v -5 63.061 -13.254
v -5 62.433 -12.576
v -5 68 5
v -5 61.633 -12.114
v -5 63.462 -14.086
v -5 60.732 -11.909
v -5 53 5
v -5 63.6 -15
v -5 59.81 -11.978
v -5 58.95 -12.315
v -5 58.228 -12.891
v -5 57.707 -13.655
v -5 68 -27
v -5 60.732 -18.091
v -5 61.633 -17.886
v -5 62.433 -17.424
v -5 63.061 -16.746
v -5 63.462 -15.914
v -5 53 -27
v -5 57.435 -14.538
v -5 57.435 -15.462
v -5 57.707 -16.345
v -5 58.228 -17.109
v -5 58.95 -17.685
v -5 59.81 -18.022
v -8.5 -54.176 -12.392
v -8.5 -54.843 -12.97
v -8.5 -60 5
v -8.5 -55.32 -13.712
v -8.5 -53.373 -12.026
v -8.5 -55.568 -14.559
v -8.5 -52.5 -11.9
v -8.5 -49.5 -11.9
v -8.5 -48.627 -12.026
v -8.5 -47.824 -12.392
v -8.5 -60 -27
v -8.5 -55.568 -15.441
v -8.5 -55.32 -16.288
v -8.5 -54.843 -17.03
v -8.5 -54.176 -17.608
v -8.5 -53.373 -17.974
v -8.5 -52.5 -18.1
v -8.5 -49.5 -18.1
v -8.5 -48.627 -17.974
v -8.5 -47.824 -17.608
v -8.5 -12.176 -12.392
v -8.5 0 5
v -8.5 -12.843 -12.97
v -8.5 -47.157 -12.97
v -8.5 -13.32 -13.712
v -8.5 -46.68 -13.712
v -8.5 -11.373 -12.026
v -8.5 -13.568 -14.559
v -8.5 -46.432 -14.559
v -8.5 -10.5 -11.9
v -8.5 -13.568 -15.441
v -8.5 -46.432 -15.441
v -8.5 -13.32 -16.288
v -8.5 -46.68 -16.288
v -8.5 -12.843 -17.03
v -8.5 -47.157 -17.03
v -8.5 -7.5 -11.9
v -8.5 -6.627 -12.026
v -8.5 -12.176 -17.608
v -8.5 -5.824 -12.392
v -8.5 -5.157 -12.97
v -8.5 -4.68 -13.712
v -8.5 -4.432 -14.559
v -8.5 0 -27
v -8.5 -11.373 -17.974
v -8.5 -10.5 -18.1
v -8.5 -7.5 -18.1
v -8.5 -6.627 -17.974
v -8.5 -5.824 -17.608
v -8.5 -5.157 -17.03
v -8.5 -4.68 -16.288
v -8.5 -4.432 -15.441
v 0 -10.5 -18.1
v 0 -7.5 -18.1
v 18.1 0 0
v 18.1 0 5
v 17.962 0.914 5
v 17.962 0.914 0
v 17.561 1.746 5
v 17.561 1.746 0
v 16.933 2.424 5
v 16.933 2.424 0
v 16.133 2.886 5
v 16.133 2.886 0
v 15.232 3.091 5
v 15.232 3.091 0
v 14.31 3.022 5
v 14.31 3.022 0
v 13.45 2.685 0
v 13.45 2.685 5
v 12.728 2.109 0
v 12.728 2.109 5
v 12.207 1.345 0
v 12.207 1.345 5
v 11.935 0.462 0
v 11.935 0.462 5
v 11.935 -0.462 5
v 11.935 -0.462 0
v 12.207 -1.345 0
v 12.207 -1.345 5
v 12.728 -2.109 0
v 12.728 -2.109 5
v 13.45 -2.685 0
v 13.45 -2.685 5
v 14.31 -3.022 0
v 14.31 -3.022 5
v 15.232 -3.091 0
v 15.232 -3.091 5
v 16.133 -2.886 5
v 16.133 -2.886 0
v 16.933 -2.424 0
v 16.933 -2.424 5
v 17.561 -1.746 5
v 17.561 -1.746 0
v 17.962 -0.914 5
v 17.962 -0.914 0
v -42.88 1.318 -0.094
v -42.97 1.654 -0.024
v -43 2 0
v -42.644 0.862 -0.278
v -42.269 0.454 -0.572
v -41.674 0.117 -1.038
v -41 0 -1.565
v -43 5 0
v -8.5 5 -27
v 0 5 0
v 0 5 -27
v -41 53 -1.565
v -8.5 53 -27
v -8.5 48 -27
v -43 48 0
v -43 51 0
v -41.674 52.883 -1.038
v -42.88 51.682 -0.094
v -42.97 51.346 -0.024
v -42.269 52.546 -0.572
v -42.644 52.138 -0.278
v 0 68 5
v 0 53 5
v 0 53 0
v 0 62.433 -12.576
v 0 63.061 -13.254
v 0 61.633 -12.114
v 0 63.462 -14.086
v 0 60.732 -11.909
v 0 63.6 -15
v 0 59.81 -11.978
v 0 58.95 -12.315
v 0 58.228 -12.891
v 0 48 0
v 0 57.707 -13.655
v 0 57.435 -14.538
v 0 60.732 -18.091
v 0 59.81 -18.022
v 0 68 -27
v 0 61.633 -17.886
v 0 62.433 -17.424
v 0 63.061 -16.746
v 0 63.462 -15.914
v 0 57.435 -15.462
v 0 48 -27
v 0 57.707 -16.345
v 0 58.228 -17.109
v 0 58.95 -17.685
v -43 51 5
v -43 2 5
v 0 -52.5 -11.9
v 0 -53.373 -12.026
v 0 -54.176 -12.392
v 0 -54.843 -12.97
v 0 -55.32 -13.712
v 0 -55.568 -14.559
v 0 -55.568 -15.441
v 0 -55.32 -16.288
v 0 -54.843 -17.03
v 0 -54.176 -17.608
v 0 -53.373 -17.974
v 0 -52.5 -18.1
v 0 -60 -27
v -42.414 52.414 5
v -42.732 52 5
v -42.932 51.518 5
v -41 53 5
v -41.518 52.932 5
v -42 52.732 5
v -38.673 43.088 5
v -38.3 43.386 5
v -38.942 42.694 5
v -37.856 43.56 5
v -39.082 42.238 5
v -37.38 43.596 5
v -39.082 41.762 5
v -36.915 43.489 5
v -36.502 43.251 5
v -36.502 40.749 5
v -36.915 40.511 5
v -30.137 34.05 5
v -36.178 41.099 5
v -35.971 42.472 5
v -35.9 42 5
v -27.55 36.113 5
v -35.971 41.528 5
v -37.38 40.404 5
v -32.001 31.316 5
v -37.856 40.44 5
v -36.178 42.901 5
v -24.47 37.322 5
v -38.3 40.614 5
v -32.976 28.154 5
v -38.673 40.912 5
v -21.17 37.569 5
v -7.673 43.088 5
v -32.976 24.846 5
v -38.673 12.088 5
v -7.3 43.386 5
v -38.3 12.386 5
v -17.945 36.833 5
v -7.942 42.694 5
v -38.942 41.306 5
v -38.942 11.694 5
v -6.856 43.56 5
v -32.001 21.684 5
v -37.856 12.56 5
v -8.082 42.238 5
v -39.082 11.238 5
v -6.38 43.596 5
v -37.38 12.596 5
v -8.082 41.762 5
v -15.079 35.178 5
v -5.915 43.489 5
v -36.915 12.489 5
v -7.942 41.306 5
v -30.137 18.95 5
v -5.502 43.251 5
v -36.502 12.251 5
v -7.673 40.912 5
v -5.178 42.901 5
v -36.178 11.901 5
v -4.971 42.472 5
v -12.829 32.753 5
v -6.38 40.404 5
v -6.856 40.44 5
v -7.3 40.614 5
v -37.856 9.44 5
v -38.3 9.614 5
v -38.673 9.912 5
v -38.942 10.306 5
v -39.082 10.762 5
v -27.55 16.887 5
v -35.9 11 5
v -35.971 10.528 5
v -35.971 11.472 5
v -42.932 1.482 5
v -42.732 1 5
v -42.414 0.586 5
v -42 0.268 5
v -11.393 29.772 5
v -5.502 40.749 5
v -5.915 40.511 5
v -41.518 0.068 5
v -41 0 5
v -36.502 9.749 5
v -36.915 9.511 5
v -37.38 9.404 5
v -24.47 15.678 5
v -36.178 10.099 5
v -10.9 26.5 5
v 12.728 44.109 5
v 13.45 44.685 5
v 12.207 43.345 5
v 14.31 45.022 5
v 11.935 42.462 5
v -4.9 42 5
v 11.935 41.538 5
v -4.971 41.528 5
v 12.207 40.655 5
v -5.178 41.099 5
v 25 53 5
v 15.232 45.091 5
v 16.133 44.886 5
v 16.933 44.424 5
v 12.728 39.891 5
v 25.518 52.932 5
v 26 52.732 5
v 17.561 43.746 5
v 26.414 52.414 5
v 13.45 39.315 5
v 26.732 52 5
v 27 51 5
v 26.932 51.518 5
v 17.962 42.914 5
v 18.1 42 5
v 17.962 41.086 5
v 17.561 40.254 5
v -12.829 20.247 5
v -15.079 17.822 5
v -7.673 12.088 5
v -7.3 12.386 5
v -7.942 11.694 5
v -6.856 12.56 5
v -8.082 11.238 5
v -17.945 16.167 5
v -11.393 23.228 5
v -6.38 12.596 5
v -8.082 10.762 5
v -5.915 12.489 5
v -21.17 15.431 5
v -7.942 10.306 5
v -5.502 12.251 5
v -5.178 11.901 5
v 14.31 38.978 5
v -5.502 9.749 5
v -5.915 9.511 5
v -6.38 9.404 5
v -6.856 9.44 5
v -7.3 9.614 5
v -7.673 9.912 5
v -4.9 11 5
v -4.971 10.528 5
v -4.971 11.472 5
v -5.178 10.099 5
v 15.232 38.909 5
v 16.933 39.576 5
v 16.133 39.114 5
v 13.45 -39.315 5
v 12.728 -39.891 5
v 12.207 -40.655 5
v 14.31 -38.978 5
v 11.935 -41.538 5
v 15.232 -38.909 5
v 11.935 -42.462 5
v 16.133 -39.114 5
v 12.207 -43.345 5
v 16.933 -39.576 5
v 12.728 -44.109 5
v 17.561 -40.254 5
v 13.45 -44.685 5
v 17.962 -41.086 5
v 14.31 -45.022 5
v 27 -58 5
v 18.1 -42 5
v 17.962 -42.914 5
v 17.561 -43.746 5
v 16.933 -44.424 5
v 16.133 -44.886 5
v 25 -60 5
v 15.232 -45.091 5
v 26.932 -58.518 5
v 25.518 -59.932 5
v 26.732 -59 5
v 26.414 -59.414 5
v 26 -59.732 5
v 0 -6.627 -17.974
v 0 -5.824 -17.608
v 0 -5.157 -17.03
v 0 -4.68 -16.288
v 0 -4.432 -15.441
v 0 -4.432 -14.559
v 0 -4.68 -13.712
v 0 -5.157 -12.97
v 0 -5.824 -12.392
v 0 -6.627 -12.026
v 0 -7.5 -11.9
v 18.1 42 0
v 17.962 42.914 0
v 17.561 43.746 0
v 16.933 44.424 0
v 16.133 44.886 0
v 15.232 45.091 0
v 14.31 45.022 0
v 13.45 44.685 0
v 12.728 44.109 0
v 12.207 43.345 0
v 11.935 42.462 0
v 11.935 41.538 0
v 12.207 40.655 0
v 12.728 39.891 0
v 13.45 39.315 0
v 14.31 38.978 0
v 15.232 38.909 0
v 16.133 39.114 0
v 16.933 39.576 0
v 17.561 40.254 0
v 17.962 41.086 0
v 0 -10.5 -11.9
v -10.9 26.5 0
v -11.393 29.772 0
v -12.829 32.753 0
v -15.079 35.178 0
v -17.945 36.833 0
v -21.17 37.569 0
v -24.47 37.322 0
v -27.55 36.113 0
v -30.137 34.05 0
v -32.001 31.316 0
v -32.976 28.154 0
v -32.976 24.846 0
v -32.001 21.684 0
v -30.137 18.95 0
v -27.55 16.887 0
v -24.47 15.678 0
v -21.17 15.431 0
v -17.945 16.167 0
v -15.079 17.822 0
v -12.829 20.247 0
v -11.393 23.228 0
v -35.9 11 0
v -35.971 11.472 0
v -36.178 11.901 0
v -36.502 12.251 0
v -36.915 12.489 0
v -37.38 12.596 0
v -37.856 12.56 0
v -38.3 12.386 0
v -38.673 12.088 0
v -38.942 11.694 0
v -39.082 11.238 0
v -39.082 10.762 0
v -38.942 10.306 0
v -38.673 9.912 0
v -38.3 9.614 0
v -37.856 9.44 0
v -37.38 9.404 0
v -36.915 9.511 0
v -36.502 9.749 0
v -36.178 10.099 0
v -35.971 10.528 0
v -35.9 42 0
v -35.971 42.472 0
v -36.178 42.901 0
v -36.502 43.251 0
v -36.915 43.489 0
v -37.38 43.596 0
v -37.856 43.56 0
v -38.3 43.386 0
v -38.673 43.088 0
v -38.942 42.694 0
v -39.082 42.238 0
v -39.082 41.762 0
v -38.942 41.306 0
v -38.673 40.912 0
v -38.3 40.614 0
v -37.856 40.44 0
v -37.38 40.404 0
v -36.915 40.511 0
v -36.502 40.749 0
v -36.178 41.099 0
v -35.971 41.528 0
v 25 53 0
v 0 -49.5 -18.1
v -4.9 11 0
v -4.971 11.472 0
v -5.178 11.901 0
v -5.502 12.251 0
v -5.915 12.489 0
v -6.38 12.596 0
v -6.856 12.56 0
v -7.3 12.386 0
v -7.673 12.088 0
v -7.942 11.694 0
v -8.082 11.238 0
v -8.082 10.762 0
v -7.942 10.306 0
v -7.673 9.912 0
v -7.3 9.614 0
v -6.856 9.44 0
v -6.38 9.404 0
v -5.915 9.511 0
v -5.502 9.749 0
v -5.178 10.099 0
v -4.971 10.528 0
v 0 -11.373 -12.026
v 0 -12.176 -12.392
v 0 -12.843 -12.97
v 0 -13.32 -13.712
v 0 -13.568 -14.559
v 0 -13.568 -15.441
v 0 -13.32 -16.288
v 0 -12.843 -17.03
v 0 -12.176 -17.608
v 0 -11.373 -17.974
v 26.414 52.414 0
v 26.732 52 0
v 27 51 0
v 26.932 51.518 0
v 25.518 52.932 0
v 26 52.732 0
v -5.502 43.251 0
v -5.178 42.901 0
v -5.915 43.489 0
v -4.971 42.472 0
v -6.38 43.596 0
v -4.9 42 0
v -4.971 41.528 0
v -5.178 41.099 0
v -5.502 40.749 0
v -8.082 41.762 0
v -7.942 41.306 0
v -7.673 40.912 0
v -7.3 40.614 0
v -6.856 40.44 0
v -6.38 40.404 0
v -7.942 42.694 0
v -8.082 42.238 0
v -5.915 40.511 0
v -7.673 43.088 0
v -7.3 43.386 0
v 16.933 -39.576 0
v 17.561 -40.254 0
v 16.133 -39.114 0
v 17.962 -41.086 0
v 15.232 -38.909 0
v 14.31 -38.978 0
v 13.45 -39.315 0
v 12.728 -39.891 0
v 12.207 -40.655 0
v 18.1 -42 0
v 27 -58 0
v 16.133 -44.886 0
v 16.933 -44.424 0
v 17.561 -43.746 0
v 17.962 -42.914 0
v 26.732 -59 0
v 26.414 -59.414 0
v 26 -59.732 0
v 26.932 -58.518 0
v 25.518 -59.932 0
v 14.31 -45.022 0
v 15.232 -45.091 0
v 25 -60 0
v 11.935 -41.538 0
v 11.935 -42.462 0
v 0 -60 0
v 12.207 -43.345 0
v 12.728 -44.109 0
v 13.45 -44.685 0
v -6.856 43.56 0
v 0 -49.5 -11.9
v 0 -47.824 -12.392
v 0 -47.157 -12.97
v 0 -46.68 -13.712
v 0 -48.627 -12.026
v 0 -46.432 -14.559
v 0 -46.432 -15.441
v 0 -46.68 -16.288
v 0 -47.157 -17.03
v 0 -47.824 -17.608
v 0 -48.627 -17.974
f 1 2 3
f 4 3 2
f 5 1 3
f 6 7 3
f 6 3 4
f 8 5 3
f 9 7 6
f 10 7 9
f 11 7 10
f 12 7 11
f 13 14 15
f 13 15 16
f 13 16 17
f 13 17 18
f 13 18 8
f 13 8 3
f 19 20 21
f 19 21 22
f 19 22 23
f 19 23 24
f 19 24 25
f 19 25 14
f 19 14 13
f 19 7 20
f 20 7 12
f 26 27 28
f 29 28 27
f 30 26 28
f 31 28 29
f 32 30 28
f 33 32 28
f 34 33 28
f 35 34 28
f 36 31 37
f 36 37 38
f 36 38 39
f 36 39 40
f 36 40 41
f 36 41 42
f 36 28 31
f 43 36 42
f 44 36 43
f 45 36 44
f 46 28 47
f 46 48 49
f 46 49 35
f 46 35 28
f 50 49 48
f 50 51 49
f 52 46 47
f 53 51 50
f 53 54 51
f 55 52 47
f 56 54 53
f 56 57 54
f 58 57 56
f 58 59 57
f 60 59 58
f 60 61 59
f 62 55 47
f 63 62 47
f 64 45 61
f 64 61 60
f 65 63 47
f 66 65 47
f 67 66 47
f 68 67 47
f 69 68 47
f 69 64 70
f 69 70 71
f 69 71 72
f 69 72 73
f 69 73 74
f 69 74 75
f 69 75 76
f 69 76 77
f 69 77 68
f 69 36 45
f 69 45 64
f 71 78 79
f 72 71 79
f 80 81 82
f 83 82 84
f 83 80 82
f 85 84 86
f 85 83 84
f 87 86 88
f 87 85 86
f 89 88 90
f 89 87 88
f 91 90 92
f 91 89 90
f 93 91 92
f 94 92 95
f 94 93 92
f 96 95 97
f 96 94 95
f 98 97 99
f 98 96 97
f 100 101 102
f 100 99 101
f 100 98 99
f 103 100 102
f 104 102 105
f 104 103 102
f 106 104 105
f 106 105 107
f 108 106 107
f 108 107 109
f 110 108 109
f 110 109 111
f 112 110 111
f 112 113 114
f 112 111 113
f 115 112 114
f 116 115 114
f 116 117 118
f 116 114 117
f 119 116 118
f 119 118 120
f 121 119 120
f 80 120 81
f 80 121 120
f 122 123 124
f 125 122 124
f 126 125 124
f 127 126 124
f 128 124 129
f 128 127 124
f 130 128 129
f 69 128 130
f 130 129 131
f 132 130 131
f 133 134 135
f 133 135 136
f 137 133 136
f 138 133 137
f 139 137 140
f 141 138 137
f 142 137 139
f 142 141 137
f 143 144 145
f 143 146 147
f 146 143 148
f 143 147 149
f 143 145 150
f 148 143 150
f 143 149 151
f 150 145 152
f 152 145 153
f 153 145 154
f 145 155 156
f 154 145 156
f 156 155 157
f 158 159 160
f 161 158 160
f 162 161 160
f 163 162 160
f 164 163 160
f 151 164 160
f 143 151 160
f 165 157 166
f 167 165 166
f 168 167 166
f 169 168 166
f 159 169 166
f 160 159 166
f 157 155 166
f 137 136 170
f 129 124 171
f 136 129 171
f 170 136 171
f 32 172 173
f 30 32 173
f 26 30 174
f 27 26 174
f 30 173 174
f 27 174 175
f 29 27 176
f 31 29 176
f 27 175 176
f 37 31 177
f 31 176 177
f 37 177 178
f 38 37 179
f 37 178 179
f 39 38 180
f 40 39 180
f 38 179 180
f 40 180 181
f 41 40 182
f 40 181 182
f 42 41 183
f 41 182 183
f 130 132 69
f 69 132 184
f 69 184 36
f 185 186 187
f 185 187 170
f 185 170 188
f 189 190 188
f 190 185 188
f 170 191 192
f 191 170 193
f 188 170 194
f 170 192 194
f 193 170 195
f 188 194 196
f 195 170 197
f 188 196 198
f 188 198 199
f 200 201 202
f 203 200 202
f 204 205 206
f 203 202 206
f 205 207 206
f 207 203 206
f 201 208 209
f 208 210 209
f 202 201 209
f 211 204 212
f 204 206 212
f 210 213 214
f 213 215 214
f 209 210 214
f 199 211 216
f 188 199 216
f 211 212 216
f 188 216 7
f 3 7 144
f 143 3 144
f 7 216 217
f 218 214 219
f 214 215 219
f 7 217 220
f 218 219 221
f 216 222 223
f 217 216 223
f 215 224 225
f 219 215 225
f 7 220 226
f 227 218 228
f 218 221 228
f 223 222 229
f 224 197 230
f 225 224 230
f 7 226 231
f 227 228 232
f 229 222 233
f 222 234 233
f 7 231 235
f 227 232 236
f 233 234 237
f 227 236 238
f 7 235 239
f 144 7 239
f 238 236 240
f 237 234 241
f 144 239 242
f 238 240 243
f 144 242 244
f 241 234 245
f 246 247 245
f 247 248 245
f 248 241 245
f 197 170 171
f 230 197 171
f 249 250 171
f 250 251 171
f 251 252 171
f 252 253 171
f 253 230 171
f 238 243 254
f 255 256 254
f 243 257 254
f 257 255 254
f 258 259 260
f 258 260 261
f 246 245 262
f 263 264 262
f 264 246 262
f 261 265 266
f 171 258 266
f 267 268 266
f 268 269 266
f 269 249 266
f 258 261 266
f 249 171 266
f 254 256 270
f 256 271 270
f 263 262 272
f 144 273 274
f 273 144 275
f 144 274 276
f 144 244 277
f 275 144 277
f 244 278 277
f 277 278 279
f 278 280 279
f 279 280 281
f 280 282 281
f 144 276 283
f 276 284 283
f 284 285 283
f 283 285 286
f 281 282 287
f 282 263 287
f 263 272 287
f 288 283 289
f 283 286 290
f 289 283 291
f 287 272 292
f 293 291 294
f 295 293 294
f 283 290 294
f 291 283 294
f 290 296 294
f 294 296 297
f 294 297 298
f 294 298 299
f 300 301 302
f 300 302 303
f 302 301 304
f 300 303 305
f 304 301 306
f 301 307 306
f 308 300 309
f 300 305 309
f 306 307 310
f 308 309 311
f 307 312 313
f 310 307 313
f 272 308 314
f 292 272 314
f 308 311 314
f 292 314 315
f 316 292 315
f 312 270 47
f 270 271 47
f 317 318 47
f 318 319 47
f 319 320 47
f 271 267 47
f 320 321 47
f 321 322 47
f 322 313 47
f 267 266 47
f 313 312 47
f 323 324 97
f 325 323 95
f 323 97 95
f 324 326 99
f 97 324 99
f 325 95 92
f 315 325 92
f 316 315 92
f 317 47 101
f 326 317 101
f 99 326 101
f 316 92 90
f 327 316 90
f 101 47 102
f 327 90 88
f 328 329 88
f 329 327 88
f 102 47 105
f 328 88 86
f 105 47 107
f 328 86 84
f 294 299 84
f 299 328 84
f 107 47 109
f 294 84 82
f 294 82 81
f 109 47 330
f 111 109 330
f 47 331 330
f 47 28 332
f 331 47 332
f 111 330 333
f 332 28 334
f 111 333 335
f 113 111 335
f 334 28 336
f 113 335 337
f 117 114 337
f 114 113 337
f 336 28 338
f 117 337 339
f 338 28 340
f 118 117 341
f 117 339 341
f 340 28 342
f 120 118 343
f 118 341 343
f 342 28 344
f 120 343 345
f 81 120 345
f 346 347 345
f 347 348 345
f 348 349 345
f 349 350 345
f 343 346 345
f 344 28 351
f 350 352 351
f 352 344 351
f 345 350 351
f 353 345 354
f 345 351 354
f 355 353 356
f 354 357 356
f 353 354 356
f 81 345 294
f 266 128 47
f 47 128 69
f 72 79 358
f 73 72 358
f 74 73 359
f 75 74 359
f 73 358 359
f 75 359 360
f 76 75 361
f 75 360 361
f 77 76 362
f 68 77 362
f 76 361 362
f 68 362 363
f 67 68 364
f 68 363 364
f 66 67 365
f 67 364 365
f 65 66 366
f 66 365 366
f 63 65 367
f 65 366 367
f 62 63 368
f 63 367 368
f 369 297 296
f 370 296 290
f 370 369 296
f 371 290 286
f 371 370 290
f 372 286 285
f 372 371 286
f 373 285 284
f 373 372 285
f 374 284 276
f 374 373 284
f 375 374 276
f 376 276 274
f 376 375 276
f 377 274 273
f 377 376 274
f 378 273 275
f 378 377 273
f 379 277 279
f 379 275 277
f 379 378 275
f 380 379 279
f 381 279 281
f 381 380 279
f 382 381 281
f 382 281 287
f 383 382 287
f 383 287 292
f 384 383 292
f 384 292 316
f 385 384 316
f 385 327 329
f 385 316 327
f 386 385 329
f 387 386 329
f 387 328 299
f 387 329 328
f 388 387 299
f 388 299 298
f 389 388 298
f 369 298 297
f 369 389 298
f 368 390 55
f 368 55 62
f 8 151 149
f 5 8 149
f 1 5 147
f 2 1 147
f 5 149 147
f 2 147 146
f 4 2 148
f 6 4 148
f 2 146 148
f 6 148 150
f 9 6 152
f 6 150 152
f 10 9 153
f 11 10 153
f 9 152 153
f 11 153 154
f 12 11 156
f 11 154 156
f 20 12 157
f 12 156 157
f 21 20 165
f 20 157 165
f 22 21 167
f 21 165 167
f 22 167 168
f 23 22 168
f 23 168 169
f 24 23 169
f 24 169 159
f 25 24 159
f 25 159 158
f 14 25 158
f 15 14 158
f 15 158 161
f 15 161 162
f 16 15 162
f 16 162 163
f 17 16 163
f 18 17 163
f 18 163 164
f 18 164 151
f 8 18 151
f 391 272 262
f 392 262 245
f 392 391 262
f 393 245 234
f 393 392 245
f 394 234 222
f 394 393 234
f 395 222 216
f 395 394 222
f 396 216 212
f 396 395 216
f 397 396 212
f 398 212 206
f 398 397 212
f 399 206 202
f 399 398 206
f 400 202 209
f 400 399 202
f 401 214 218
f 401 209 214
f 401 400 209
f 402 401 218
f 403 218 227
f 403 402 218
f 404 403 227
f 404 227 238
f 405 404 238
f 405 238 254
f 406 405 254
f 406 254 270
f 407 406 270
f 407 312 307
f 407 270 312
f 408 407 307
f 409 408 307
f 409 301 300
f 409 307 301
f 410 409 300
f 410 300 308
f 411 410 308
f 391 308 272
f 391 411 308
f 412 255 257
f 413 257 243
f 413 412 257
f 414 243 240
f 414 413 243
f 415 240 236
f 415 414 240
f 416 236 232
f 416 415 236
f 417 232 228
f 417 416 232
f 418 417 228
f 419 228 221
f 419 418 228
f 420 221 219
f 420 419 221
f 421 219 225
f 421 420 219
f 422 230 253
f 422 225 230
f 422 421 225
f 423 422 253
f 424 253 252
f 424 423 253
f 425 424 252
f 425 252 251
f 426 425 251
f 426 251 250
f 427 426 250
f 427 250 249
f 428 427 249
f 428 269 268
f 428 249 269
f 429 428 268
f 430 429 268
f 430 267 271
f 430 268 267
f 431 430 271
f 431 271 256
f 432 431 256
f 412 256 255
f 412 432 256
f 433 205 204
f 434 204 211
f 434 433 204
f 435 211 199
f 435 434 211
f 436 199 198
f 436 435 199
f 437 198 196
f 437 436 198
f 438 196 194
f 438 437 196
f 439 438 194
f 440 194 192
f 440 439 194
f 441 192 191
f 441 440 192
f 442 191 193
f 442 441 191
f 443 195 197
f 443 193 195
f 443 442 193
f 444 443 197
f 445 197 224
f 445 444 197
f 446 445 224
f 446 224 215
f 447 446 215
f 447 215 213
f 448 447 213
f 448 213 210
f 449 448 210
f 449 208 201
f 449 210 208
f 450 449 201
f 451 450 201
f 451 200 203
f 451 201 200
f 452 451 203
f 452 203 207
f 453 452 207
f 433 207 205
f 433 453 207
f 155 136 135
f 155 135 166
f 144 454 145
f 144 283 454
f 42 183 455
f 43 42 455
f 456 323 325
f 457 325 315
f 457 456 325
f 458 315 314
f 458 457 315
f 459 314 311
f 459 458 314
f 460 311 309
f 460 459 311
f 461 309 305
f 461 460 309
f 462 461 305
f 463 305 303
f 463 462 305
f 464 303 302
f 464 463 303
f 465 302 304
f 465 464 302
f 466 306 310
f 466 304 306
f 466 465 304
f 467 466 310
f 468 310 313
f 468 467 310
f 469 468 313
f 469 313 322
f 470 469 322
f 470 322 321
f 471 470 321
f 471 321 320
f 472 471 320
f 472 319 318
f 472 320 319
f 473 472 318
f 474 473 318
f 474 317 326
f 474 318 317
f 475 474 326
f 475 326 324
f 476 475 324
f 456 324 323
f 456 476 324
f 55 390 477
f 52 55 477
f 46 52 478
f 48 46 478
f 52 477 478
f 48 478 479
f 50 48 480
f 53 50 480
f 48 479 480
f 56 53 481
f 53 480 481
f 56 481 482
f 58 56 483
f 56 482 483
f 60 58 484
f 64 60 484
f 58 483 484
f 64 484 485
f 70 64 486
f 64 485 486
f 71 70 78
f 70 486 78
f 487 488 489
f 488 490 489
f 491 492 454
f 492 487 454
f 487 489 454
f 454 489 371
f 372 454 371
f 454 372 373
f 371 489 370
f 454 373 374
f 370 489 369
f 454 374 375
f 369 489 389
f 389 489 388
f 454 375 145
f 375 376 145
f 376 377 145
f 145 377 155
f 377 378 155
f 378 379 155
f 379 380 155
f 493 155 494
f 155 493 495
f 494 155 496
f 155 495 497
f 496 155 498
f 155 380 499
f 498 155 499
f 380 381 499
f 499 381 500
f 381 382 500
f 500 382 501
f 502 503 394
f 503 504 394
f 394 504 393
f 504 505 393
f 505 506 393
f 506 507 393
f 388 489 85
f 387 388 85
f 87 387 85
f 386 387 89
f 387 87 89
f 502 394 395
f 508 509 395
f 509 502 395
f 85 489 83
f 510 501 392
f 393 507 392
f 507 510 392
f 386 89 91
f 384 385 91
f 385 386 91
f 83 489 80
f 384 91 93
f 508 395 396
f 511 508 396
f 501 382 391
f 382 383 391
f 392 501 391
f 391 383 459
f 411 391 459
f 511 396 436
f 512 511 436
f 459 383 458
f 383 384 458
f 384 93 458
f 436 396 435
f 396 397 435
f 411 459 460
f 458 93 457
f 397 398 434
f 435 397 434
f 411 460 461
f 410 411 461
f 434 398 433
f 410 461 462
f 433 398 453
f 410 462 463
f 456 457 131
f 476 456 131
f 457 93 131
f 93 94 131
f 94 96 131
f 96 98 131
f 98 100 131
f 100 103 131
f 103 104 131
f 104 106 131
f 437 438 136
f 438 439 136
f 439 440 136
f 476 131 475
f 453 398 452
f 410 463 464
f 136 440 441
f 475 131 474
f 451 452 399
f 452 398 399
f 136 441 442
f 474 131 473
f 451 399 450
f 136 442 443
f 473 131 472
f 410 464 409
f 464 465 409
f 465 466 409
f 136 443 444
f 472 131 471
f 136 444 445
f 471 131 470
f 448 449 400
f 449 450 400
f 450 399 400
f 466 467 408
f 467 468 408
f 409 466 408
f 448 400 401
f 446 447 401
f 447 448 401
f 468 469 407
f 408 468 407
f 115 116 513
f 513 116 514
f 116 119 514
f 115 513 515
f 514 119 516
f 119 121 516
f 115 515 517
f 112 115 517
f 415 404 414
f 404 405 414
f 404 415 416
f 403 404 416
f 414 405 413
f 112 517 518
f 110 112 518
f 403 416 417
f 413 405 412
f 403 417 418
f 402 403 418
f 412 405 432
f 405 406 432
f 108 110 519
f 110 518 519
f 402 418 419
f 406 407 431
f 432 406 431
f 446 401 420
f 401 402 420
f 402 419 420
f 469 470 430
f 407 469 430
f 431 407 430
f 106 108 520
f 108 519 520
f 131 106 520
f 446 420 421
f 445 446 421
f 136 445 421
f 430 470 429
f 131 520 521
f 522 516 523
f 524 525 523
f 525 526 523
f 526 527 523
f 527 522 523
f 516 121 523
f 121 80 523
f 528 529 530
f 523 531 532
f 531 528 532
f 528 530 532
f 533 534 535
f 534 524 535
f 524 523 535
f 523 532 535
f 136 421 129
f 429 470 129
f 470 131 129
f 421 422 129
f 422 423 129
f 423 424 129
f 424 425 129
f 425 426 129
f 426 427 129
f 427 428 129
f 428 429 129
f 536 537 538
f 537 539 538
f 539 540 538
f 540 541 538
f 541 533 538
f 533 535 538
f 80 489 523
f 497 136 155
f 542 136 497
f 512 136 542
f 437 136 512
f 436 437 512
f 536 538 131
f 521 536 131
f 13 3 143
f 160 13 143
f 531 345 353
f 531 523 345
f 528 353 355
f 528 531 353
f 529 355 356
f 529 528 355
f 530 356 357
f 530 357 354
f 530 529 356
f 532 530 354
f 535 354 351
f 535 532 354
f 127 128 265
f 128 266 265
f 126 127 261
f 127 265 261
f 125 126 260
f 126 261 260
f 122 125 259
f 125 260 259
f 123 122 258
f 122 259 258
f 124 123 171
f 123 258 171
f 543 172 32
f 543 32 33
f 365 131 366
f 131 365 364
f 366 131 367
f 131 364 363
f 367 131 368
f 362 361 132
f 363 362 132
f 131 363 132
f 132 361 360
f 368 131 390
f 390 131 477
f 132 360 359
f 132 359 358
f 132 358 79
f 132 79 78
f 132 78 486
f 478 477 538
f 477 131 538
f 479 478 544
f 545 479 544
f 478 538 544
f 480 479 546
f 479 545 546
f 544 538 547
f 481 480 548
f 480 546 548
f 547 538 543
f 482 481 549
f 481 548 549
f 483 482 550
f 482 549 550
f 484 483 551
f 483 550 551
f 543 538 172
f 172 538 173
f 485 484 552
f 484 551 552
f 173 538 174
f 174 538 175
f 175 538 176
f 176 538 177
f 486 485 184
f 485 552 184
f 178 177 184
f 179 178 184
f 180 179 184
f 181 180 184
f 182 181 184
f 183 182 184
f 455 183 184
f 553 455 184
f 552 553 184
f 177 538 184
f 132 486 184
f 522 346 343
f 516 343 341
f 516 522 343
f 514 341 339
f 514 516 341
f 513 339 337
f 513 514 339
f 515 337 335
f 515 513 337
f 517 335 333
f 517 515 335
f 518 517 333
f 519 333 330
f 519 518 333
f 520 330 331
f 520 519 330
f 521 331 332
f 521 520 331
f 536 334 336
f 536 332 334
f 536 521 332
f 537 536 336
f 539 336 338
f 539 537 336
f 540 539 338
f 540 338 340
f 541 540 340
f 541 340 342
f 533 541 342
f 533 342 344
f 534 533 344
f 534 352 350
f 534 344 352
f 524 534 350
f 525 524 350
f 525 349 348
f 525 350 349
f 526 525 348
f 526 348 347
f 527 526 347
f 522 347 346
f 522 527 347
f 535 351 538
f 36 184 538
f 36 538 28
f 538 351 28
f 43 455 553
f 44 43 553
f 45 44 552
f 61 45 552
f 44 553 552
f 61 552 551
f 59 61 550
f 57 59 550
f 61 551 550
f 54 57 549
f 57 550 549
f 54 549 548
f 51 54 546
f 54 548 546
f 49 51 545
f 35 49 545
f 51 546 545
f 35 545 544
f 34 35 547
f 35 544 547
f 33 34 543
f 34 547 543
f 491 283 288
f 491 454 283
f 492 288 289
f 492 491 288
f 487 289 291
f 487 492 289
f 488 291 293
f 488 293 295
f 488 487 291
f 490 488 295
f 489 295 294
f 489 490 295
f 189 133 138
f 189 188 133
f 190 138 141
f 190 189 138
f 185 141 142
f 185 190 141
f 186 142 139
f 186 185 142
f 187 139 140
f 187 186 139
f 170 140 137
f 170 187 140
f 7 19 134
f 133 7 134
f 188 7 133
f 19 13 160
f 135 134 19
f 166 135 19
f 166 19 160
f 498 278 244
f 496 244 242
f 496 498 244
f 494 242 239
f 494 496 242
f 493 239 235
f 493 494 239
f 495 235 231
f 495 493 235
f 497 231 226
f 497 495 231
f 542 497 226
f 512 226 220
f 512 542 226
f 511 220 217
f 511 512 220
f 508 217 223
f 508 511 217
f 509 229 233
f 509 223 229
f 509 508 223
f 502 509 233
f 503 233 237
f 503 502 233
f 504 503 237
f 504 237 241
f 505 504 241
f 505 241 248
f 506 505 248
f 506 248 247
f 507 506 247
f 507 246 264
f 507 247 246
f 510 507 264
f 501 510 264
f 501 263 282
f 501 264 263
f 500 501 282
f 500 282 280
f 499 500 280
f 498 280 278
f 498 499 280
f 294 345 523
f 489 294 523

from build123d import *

# Parameters (mm, degrees)
PAD_DEPTH         = 60
PAD_DEPTH_BACK    = 53
SKETCH001_R       = 11.1
SKETCH001_R_2     = 3.1
SKETCH001_R_3     = 1.6
SKETCH001_W       = 34.5
SKETCH001_H       = 60
POCKET_DEPTH      = 27.001
POCKET_DEPTH_BACK = -5.001
POCKET001_DEPTH   = 43.001
PAD001_DEPTH      = 5
PAD002_DEPTH      = 5
SKETCH005_W       = 43
SKETCH005_H       = 27
POCKET002_DEPTH   = 43.001
SKETCH006_W       = 5
SKETCH006_H       = 32
PAD003_DEPTH      = 15
SKETCH007_R       = 3.1
POCKET003_DEPTH   = 43.001
FILLET_R          = 2


with BuildPart() as part:
    # Sketch → Pad (new body, two sides)
    with BuildSketch(Plane.XZ) as pad_sk:
        Polygon((-43, 5), (27, 5), (27, 0), (0, 0), (0, -27), (-8.5, -27), (-8.5, 0), (-43, 0), align=None)
    extrude(amount=PAD_DEPTH)
    extrude(pad_sk.sketch, amount=-PAD_DEPTH_BACK)

    # Sketch001 → Pocket (cut, two sides)
    with BuildSketch(Plane.XY) as pocket_sk:
        with Locations((-22, 26.5)):
            Circle(SKETCH001_R)
        with Locations((15, 42)):
            Circle(SKETCH001_R_2)
        with Locations((15, -42)):
            Circle(SKETCH001_R_2)
        with Locations((15, 0)):
            Circle(SKETCH001_R_2)
        with Locations((-37.5, 42)):
            Circle(SKETCH001_R_3)
        with Locations((-6.5, 42)):
            Circle(SKETCH001_R_3)
        with Locations((-6.5, 11)):
            Circle(SKETCH001_R_3)
        with Locations((-37.5, 11)):
            Circle(SKETCH001_R_3)
        with Locations((-25.75, -30)):
            Rectangle(SKETCH001_W, SKETCH001_H)
    extrude(amount=-POCKET_DEPTH, mode=Mode.SUBTRACT)
    extrude(pocket_sk.sketch, amount=-POCKET_DEPTH_BACK, mode=Mode.SUBTRACT)

    # Sketch002 → Pocket001 (cut, through all)
    with BuildSketch(Plane.YZ):
        with BuildLine():
            ThreePointArc((-52.5, -11.9), (-55.6, -15), (-52.5, -18.1))
            Line((-52.5, -18.1), (-49.5, -18.1))
            ThreePointArc((-49.5, -18.1), (-46.4, -15), (-49.5, -11.9))
            Line((-52.5, -11.9), (-49.5, -11.9))
        make_face()
        with BuildLine():
            ThreePointArc((-10.5, -11.9), (-13.6, -15), (-10.5, -18.1))
            Line((-10.5, -18.1), (-7.5, -18.1))
            ThreePointArc((-7.5, -18.1), (-4.4, -15), (-7.5, -11.9))
            Line((-10.5, -11.9), (-7.5, -11.9))
        make_face()
    extrude(amount=-POCKET001_DEPTH, mode=Mode.SUBTRACT)

    # Sketch003 → Pad001 (join)
    with BuildSketch(Plane.XZ):
        Polygon((-43, 5), (-43, 0), (-8.5, -27), (0, -27), (0, 5), align=None)
    extrude(amount=-PAD001_DEPTH)

    # Sketch004 (on Face1 of Pad001) → Pad002 (join)
    with BuildSketch(Plane(origin=(0, 53, 0), x_dir=(1, 0, 0), z_dir=(0, 1, 0))):
        Polygon((-43, -5), (0, -5), (0, 27), (-8.5, 27), (-43, 0), align=None)
    extrude(amount=-PAD002_DEPTH)

    # Sketch005 → Pocket002 (cut, through all)
    with BuildSketch(Plane.YZ):
        with Locations((26.5, -13.5)):
            Rectangle(SKETCH005_W, SKETCH005_H)
    extrude(amount=-POCKET002_DEPTH, mode=Mode.SUBTRACT)

    # Sketch006 (on Face4 of Pocket002) → Pad003 (join)
    with BuildSketch(Plane(origin=(0, 53, 0), x_dir=(1, 0, 0), z_dir=(0, 1, 0))):
        with Locations((-2.5, 11)):
            Rectangle(SKETCH006_W, SKETCH006_H)
    extrude(amount=PAD003_DEPTH)

    # Sketch007 → Pocket003 (cut, through all)
    with BuildSketch(Plane.YZ):
        with Locations((60.5, -15)):
            Circle(SKETCH007_R)
    extrude(amount=-POCKET003_DEPTH, mode=Mode.SUBTRACT)

    # Fillet
    fillet_edges = [part.edges().sort_by_distance(p)[0] for p in [
        (27, -60, 2.5),
        (27, 53, 2.5),
        (-43, 0, 2.5),
        (-43, 53, 2.5),
    ]]
    fillet(fillet_edges, radius=FILLET_R)


solid = part.part
